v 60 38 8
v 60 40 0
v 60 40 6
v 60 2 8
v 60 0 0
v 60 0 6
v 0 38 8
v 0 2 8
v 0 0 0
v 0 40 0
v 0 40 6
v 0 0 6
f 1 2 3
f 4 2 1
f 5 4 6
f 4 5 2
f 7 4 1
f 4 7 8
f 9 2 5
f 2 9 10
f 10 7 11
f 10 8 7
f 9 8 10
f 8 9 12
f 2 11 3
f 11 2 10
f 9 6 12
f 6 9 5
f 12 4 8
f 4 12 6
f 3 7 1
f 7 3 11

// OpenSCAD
// Hand-written ground truth. Coordinates: [0,L] x [0,W] x [0,H].
$fn = 64;
body_length = 60;
body_width = 40;
body_height = 8;
chamfer_1_width = 2;
chamfer_2_width = 2;

module chamfered_block(body_length=60, body_width=40, body_height=8,
                       chamfer_1_width=2, chamfer_2_width=2) {
    assert(min(body_length,body_width,body_height)>0);
    assert(min(chamfer_1_width,chamfer_2_width)>0);
    assert(max(chamfer_1_width,chamfer_2_width)<body_height);
    assert(chamfer_1_width+chamfer_2_width<body_width);
    module along_x() {
        multmatrix([[0,0,1,-1],[1,0,0,0],[0,1,0,0],[0,0,0,1]])
            linear_extrude(height=body_length+2) children();
    }
    difference() {
        cube([body_length,body_width,body_height]);
        along_x() polygon([[0,body_height],
            [chamfer_1_width,body_height],[0,body_height-chamfer_1_width]]);
        along_x() polygon([[body_width,body_height],
            [body_width-chamfer_2_width,body_height],
            [body_width,body_height-chamfer_2_width]]);
    }
}

chamfered_block(body_length,body_width,body_height,chamfer_1_width,chamfer_2_width);
